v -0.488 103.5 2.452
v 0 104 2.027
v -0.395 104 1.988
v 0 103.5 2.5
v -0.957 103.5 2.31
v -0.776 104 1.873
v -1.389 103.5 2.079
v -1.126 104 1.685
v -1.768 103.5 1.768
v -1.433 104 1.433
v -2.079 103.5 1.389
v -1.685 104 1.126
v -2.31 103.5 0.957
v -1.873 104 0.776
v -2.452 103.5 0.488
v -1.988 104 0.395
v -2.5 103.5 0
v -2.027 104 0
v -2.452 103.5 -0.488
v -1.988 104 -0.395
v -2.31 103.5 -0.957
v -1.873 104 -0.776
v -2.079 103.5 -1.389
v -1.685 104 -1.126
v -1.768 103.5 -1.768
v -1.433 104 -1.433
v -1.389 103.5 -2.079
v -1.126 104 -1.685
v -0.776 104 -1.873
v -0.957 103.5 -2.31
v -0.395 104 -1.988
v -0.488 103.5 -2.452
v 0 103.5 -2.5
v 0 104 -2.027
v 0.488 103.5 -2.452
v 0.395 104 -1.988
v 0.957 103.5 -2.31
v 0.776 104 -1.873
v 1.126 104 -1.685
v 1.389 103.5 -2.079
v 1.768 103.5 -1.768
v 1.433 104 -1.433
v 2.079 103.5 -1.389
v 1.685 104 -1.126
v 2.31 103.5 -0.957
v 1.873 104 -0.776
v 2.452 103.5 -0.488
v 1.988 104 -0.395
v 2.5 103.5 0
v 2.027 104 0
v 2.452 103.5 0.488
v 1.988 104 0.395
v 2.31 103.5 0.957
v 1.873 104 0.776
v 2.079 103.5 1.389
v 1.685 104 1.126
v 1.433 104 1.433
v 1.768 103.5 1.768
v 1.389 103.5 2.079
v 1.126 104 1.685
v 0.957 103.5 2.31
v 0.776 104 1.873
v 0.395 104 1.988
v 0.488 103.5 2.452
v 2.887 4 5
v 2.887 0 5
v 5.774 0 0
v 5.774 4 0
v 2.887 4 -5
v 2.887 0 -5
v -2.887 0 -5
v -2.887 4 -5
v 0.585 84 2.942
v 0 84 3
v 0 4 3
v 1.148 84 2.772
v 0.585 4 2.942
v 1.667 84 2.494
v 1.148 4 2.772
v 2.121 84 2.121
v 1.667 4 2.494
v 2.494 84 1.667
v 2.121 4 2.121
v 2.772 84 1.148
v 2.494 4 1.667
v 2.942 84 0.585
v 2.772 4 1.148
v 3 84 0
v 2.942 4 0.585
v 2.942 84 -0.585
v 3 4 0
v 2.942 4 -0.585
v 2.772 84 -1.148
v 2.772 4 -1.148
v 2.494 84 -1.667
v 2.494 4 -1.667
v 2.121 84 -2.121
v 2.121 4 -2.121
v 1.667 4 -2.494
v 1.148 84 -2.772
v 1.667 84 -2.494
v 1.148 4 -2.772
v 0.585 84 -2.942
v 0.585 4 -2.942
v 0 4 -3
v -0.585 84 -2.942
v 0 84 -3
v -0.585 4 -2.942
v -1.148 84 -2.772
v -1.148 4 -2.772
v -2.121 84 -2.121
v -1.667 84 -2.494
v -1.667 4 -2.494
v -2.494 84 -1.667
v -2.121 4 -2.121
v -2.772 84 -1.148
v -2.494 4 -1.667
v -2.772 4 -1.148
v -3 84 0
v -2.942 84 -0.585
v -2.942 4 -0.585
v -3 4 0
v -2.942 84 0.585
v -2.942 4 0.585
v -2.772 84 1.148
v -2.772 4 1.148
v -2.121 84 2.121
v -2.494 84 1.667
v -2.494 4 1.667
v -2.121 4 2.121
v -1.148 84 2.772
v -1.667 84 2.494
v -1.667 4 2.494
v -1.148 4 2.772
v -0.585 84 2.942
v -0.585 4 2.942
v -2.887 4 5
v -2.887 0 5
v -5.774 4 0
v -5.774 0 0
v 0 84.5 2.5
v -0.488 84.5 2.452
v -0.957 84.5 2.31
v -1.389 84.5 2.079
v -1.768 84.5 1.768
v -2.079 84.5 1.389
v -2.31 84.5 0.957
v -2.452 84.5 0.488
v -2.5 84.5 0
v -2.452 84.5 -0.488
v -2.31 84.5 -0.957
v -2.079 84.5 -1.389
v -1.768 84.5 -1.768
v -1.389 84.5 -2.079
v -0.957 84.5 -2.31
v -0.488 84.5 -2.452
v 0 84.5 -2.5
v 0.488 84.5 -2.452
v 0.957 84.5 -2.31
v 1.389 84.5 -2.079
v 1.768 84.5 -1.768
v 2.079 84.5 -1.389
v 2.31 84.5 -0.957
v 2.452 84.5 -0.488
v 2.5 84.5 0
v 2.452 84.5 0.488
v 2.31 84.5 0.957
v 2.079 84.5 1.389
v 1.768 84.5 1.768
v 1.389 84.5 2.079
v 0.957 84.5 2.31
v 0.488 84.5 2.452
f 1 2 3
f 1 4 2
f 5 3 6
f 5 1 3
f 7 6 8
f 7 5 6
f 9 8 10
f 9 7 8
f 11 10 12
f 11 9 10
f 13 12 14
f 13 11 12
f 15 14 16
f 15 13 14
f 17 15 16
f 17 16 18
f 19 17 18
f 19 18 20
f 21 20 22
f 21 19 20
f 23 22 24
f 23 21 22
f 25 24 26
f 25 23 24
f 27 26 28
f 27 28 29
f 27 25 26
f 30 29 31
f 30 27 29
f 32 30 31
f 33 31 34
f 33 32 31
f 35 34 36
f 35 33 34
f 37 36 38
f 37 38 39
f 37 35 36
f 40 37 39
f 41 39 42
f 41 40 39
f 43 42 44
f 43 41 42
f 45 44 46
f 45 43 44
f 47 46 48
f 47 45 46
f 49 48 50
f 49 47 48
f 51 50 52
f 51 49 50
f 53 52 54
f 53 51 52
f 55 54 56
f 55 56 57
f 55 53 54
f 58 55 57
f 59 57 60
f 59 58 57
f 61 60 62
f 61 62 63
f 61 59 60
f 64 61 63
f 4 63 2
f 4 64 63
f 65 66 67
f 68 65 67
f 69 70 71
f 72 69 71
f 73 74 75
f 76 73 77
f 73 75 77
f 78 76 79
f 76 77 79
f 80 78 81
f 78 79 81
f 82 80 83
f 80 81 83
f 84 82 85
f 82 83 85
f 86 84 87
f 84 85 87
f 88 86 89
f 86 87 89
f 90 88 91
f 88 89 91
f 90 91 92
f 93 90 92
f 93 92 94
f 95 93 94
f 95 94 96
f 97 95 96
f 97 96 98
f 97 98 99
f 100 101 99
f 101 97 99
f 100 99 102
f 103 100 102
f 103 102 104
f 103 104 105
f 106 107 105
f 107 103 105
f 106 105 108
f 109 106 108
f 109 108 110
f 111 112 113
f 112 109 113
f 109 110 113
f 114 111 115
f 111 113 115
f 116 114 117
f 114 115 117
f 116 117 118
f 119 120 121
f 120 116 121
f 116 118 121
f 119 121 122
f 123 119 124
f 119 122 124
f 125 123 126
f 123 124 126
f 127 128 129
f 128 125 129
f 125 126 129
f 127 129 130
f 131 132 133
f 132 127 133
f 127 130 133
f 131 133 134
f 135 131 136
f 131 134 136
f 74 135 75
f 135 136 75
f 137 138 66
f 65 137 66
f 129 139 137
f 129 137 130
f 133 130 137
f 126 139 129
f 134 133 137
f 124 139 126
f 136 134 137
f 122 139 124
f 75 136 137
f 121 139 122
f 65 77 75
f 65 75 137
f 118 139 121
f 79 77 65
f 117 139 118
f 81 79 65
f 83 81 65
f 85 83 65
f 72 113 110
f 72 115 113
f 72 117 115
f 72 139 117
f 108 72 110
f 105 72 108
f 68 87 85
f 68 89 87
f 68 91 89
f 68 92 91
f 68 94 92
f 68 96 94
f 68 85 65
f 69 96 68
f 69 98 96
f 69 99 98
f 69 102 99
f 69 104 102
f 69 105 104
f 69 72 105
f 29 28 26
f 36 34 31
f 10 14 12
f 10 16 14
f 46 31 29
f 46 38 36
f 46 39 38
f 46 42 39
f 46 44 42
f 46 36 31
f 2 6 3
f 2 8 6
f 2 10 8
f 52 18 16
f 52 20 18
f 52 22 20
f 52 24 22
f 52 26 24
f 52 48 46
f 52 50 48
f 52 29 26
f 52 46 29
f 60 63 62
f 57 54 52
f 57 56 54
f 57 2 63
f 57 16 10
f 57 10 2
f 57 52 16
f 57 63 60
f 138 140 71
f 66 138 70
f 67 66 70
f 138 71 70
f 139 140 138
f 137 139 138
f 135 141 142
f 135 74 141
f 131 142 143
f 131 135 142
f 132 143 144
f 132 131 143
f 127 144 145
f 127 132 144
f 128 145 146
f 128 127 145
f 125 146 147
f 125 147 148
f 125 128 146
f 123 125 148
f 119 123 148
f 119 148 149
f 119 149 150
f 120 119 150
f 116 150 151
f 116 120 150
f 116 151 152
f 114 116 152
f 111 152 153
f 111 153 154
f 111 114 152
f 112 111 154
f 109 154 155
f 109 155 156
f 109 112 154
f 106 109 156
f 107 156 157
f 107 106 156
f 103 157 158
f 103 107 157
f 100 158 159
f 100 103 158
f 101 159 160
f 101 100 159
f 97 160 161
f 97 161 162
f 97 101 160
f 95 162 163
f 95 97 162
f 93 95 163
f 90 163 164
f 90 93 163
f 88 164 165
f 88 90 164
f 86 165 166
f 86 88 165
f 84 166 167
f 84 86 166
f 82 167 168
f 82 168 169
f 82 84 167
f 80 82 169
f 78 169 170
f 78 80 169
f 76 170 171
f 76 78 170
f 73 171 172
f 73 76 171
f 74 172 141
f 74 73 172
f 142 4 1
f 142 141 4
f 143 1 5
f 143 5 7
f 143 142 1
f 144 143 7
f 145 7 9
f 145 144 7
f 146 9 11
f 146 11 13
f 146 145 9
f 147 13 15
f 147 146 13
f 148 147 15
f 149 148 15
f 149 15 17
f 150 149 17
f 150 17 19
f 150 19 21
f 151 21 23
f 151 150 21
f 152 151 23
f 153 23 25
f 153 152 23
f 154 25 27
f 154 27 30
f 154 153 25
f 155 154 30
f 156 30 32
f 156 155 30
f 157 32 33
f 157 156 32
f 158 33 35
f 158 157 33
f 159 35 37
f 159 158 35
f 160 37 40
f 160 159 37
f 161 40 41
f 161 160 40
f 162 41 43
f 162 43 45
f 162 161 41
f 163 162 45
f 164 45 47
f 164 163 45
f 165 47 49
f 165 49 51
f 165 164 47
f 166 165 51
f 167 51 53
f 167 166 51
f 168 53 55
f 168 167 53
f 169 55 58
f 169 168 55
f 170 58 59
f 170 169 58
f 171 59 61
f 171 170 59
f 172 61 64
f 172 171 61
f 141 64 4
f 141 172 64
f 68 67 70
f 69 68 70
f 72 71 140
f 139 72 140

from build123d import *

# Parameters (mm, degrees)
Y_KSEKLIK_EKSTR_ZYON1_DEPTH = 4
IZIM3_R                     = 3
Y_KSEKLIK_EKSTR_ZYON2_DEPTH = 100


with BuildPart() as part:
    # Çizim2 → Yükseklik-Ekstrüzyon1 (new body)
    with BuildSketch(Plane(origin=(0, 0, 0), x_dir=(1, 0, 0), z_dir=(0, 1, 0))):
        Polygon((5.773502692, 0), (2.886751346, 5), (-2.886751346, 5), (-5.773502692, 0), (-2.886751346, -5), (2.886751346, -5), align=None)
    extrude(amount=Y_KSEKLIK_EKSTR_ZYON1_DEPTH)

    # Çizim3 → Yükseklik-Ekstrüzyon2 (add)
    with BuildSketch(Plane(origin=(0, 4, 0), x_dir=(1, 0, 0), z_dir=(0, 1, 0))):
        with Locations(Location((0, 0, 0), (0, 0, 270))):
            Circle(IZIM3_R)
    extrude(amount=Y_KSEKLIK_EKSTR_ZYON2_DEPTH)

    # Çizim4 → Kes-Döndür1 (revolve, cut)
    with BuildSketch(Plane.XY, mode=Mode.PRIVATE) as kes_d_nd_r1_sk:
        Polygon((-2.5, 103.5), (-2.5, 84.5), (-3, 84), (-5.565030224, 84), (-5.565030224, 104), (-2.5, 104), (-2.027017716, 104), align=None)
    revolve(kes_d_nd_r1_sk.sketch.rotate(Axis((0, 106.310945379, 0), (0, -1, 0)), 270), axis=Axis((0, 106.310945379, 0), (0, -1, 0)), mode=Mode.SUBTRACT)


solid = part.part
